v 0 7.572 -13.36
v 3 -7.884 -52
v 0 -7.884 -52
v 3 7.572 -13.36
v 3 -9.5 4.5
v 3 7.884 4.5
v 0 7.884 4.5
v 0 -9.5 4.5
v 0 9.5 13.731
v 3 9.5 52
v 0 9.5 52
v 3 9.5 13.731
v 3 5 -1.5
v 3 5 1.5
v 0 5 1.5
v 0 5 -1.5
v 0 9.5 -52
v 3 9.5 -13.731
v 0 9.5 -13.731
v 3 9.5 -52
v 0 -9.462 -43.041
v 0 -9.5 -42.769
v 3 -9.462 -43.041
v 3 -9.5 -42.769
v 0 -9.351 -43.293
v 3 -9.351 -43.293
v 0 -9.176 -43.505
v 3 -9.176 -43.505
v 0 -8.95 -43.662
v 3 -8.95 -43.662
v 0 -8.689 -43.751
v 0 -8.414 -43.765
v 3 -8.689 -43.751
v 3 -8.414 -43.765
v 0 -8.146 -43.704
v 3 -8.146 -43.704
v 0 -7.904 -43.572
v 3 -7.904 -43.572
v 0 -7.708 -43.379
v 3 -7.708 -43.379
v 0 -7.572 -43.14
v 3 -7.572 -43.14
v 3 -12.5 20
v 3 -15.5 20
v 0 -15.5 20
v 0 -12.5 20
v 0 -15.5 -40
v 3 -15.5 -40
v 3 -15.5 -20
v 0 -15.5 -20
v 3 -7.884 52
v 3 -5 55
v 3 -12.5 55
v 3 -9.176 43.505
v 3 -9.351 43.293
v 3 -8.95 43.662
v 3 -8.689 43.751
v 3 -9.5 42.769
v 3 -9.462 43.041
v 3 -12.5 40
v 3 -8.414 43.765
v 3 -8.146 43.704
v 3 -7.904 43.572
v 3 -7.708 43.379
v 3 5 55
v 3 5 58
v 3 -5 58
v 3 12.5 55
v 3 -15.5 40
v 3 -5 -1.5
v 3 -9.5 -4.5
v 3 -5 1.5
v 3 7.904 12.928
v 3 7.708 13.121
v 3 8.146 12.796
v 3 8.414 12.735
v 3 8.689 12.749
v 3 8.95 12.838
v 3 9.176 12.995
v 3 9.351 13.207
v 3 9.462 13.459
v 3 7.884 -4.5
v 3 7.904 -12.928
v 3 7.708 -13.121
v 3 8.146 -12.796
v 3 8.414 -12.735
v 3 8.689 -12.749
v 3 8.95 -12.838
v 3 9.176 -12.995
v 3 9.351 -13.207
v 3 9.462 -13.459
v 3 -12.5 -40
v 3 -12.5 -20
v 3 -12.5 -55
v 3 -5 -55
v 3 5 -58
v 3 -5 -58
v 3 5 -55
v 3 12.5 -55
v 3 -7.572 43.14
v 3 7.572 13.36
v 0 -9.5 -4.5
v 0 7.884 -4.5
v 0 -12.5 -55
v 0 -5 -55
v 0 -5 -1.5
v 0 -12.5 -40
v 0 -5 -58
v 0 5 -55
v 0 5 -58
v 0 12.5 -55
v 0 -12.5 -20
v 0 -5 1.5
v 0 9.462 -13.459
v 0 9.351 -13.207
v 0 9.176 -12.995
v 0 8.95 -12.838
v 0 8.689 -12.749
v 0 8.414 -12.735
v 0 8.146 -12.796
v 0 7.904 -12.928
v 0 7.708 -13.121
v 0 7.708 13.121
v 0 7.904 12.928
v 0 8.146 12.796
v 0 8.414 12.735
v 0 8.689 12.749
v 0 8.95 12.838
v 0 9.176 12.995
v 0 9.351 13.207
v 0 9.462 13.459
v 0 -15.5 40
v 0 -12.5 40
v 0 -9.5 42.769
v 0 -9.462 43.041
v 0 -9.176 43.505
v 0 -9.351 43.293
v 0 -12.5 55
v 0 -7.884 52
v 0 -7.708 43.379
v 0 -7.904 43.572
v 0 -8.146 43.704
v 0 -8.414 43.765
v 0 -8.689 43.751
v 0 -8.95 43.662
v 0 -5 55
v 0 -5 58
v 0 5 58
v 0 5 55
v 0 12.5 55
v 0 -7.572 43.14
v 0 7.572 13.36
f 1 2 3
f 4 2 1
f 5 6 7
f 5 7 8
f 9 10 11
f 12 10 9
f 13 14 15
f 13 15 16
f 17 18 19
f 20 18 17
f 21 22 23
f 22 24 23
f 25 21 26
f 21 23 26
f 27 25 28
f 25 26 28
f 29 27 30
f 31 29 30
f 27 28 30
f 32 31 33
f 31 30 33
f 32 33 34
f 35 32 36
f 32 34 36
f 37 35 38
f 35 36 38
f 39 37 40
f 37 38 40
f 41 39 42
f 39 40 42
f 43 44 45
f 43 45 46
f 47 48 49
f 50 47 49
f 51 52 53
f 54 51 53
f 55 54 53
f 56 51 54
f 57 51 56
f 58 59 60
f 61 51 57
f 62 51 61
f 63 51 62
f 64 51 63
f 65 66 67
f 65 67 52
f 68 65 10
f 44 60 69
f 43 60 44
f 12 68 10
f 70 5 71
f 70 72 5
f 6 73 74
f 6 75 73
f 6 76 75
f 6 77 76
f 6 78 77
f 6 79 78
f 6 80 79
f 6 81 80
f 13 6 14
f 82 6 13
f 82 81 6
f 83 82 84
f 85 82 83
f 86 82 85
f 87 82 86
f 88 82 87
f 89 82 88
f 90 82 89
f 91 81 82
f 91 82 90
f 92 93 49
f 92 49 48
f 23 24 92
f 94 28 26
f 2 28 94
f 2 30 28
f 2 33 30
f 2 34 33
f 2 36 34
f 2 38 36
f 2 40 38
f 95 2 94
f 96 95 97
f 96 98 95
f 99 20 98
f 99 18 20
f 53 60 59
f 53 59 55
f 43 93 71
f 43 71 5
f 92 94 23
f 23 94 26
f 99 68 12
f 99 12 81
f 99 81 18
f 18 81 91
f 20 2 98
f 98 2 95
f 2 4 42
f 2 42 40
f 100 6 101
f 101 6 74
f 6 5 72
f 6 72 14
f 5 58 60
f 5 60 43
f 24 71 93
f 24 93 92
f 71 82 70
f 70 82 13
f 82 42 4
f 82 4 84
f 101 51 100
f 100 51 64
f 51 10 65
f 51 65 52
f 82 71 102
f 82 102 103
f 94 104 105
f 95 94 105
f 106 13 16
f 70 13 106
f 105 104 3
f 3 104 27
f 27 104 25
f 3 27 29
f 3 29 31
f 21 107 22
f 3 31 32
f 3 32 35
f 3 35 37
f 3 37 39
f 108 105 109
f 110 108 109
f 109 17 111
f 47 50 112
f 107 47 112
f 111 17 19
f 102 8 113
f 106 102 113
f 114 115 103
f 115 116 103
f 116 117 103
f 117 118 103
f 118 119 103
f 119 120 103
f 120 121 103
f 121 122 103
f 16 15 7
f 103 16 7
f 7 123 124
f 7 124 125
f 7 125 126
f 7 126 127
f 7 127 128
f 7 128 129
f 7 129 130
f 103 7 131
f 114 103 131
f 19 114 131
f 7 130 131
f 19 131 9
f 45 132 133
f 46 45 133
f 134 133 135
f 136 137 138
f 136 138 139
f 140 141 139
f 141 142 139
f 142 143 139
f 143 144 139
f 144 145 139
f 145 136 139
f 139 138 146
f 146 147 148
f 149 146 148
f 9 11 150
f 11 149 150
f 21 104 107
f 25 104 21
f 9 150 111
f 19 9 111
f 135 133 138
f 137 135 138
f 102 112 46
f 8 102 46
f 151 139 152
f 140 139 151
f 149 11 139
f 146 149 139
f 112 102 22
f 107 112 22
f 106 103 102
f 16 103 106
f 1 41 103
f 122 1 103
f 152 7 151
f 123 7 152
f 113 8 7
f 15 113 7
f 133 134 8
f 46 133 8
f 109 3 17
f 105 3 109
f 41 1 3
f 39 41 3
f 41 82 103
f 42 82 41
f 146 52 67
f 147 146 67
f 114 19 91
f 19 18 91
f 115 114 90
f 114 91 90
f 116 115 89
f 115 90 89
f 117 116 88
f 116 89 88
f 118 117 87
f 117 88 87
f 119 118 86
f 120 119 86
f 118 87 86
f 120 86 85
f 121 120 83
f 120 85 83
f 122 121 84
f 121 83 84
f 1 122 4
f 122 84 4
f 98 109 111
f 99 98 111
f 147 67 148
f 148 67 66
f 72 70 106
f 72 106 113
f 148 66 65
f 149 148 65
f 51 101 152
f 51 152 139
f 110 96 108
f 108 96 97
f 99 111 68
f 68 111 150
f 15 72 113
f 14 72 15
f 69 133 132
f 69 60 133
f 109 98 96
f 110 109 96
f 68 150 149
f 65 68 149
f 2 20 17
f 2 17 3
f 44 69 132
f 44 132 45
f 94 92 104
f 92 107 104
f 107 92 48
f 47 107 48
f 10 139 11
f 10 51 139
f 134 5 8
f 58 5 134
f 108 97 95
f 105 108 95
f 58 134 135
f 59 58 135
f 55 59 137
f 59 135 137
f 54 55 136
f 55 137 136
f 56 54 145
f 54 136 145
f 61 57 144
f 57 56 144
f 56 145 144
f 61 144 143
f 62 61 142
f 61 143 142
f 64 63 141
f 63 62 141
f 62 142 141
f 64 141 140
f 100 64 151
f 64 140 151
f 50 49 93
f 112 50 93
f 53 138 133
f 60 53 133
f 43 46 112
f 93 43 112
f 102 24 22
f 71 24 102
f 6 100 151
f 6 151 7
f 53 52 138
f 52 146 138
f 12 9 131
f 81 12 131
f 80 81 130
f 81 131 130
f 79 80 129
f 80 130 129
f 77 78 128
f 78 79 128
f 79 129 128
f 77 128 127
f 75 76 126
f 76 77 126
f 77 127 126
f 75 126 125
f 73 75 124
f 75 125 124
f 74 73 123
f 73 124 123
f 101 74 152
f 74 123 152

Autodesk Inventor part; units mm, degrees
ref_plane "YZ Plane" through (0, 0, 0) normal (1, 0, 0) x (0, 1, 0)
ref_plane "XZ Plane" through (0, 0, 0) normal (0, 1, 0) x (-1, 0, 0)
ref_plane "XY Plane" through (0, 0, 0) normal (0, 0, 1) x (1, 0, 0)
sketch "Sketch1" plane through (0, 0, 0) normal (1, 0, 0) x (0, 1, 0)
  line L0 (-12.5, -55) -> (12.5, -55)
  line L1 (12.5, -55) -> (12.5, 55)
  line L2 (12.5, 55) -> (-12.5, 55)
  line L3 (-12.5, 55) -> (-12.5, -55)
  line L4 (-12.5, -55) -> (12.5, 55) construction
  line L5 (12.5, -55) -> (-12.5, 55) construction
  point P0 (0, 0)
  dimension "d0" = 25
  dimension "d1" = 110
extrude "Extrusion1" add sketch "Sketch1" along normal blind 3
sketch "Sketch2" plane through (3, 0, 0) normal (1, 0, 0) x (0, 0, -1)
  line L0 (20, -12.5) -> (40, -12.5)
  line L1 (40, -12.5) -> (40, -15.5)
  line L2 (40, -15.5) -> (20, -15.5)
  line L3 (20, -15.5) -> (20, -12.5)
  line L4 (-55, -12.5) -> (55, -12.5) projected
  line L5 (-20, -12.5) -> (-40, -12.5)
  line L6 (-40, -12.5) -> (-40, -15.5)
  line L7 (-40, -15.5) -> (-20, -15.5)
  line L8 (-20, -15.5) -> (-20, -12.5)
  point P0 (0, 0)
  dimension "d4" = 20
  dimension "d5" = 3
  dimension "d6" = 20
  dimension "d7" = 20
  dimension "d8" = 3
  dimension "d9" = 20
extrude "Extrusion2" add sketch "Sketch2" against normal blind 3
sketch "Sketch3" plane through (3, 0, 0) normal (1, 0, 0) x (0, 0, -1)
  line L0 (-1.5, 5) -> (1.5, 5)
  line L1 (1.5, 5) -> (1.5, -5)
  line L2 (1.5, -5) -> (-1.5, -5)
  line L3 (-1.5, -5) -> (-1.5, 5)
  point P0 (0, 0)
  point P1 (-1.5, 0)
  point P2 (0, 5)
  dimension "d12" = 3
  dimension "d13" = 10
extrude "Extrusion3" cut sketch "Sketch3" against normal blind 3
sketch "Sketch4" plane through (3, 0, 0) normal (1, 0, 0) x (0, 0, -1)
  line L0 (55, -12.5) -> (55, 12.5) projected
  line L1 (55, 5) -> (58, 5)
  line L2 (58, 5) -> (58, -5)
  line L3 (58, -5) -> (55, -5)
  line L4 (55, -5) -> (55, 5)
  point P0 (0, 0)
  point P1 (58, 0)
  point P2 (55, 0)
  dimension "d16" = 3
  dimension "d17" = 10
extrude "Extrusion4" add sketch "Sketch4" against normal blind 3
sketch "Sketch5" plane through (3, 0, 0) normal (1, 0, 0) x (0, 0, -1)
  line L0 (4.5, 9.5) -> (52, 9.5)
  line L1 (52, 9.5) -> (52, -9.5)
  line L2 (52, -9.5) -> (4.5, -9.5)
  line L3 (4.5, -9.5) -> (4.5, 9.5)
  line L4 (55, 12.5) -> (-55, 12.5) projected
  line L5 (1.5, -5) -> (1.5, 5) projected
  line L6 (55, 5) -> (55, 12.5) projected
  line L7 (40, -12.5) -> (55, -12.5) projected
  point P0 (0, 0)
  dimension "d20" = 3
  dimension "d21" = 3
  dimension "d22" = 3
  dimension "d23" = 3
extrude "Extrusion5" cut sketch "Sketch5" against normal blind 3
sketch "Sketch6" plane through (3, 0, 0) normal (1, 0, 0) x (0, 0, -1)
  line L0 (4.5, 9.5) -> (52, -9.5) construction
  line L1 (3.9429, 8.1073) -> (51.4429, -10.8927)
  line L2 (52.5571, -8.1073) -> (5.0571, 10.8927)
  arc A0 (5.0571, 10.8927) -> (3.9429, 8.1073) centre (4.5, 9.5) ccw
  arc A1 (51.4429, -10.8927) -> (52.5571, -8.1073) centre (52, -9.5) ccw
  point P0 (0, 0)
  point P1 (28.25, 0)
  dimension "d26" = 3
extrude "Extrusion6" add sketch "Sketch6" against normal blind 3
fillet "Fillet1" radius 1 2 edges at (1.5, -9.5, -47.9611) (1.5, 9.5, -8.5389)
mirror "Mirror1" about plane through (0, 0, 0) normal (0, 0, 1) of "Extrusion5", "Extrusion6", "Fillet1", "Extrusion4"
equation "\"d9\" = d6"
equation "\"d23\" = d20"
properties part number "Battery holder"
